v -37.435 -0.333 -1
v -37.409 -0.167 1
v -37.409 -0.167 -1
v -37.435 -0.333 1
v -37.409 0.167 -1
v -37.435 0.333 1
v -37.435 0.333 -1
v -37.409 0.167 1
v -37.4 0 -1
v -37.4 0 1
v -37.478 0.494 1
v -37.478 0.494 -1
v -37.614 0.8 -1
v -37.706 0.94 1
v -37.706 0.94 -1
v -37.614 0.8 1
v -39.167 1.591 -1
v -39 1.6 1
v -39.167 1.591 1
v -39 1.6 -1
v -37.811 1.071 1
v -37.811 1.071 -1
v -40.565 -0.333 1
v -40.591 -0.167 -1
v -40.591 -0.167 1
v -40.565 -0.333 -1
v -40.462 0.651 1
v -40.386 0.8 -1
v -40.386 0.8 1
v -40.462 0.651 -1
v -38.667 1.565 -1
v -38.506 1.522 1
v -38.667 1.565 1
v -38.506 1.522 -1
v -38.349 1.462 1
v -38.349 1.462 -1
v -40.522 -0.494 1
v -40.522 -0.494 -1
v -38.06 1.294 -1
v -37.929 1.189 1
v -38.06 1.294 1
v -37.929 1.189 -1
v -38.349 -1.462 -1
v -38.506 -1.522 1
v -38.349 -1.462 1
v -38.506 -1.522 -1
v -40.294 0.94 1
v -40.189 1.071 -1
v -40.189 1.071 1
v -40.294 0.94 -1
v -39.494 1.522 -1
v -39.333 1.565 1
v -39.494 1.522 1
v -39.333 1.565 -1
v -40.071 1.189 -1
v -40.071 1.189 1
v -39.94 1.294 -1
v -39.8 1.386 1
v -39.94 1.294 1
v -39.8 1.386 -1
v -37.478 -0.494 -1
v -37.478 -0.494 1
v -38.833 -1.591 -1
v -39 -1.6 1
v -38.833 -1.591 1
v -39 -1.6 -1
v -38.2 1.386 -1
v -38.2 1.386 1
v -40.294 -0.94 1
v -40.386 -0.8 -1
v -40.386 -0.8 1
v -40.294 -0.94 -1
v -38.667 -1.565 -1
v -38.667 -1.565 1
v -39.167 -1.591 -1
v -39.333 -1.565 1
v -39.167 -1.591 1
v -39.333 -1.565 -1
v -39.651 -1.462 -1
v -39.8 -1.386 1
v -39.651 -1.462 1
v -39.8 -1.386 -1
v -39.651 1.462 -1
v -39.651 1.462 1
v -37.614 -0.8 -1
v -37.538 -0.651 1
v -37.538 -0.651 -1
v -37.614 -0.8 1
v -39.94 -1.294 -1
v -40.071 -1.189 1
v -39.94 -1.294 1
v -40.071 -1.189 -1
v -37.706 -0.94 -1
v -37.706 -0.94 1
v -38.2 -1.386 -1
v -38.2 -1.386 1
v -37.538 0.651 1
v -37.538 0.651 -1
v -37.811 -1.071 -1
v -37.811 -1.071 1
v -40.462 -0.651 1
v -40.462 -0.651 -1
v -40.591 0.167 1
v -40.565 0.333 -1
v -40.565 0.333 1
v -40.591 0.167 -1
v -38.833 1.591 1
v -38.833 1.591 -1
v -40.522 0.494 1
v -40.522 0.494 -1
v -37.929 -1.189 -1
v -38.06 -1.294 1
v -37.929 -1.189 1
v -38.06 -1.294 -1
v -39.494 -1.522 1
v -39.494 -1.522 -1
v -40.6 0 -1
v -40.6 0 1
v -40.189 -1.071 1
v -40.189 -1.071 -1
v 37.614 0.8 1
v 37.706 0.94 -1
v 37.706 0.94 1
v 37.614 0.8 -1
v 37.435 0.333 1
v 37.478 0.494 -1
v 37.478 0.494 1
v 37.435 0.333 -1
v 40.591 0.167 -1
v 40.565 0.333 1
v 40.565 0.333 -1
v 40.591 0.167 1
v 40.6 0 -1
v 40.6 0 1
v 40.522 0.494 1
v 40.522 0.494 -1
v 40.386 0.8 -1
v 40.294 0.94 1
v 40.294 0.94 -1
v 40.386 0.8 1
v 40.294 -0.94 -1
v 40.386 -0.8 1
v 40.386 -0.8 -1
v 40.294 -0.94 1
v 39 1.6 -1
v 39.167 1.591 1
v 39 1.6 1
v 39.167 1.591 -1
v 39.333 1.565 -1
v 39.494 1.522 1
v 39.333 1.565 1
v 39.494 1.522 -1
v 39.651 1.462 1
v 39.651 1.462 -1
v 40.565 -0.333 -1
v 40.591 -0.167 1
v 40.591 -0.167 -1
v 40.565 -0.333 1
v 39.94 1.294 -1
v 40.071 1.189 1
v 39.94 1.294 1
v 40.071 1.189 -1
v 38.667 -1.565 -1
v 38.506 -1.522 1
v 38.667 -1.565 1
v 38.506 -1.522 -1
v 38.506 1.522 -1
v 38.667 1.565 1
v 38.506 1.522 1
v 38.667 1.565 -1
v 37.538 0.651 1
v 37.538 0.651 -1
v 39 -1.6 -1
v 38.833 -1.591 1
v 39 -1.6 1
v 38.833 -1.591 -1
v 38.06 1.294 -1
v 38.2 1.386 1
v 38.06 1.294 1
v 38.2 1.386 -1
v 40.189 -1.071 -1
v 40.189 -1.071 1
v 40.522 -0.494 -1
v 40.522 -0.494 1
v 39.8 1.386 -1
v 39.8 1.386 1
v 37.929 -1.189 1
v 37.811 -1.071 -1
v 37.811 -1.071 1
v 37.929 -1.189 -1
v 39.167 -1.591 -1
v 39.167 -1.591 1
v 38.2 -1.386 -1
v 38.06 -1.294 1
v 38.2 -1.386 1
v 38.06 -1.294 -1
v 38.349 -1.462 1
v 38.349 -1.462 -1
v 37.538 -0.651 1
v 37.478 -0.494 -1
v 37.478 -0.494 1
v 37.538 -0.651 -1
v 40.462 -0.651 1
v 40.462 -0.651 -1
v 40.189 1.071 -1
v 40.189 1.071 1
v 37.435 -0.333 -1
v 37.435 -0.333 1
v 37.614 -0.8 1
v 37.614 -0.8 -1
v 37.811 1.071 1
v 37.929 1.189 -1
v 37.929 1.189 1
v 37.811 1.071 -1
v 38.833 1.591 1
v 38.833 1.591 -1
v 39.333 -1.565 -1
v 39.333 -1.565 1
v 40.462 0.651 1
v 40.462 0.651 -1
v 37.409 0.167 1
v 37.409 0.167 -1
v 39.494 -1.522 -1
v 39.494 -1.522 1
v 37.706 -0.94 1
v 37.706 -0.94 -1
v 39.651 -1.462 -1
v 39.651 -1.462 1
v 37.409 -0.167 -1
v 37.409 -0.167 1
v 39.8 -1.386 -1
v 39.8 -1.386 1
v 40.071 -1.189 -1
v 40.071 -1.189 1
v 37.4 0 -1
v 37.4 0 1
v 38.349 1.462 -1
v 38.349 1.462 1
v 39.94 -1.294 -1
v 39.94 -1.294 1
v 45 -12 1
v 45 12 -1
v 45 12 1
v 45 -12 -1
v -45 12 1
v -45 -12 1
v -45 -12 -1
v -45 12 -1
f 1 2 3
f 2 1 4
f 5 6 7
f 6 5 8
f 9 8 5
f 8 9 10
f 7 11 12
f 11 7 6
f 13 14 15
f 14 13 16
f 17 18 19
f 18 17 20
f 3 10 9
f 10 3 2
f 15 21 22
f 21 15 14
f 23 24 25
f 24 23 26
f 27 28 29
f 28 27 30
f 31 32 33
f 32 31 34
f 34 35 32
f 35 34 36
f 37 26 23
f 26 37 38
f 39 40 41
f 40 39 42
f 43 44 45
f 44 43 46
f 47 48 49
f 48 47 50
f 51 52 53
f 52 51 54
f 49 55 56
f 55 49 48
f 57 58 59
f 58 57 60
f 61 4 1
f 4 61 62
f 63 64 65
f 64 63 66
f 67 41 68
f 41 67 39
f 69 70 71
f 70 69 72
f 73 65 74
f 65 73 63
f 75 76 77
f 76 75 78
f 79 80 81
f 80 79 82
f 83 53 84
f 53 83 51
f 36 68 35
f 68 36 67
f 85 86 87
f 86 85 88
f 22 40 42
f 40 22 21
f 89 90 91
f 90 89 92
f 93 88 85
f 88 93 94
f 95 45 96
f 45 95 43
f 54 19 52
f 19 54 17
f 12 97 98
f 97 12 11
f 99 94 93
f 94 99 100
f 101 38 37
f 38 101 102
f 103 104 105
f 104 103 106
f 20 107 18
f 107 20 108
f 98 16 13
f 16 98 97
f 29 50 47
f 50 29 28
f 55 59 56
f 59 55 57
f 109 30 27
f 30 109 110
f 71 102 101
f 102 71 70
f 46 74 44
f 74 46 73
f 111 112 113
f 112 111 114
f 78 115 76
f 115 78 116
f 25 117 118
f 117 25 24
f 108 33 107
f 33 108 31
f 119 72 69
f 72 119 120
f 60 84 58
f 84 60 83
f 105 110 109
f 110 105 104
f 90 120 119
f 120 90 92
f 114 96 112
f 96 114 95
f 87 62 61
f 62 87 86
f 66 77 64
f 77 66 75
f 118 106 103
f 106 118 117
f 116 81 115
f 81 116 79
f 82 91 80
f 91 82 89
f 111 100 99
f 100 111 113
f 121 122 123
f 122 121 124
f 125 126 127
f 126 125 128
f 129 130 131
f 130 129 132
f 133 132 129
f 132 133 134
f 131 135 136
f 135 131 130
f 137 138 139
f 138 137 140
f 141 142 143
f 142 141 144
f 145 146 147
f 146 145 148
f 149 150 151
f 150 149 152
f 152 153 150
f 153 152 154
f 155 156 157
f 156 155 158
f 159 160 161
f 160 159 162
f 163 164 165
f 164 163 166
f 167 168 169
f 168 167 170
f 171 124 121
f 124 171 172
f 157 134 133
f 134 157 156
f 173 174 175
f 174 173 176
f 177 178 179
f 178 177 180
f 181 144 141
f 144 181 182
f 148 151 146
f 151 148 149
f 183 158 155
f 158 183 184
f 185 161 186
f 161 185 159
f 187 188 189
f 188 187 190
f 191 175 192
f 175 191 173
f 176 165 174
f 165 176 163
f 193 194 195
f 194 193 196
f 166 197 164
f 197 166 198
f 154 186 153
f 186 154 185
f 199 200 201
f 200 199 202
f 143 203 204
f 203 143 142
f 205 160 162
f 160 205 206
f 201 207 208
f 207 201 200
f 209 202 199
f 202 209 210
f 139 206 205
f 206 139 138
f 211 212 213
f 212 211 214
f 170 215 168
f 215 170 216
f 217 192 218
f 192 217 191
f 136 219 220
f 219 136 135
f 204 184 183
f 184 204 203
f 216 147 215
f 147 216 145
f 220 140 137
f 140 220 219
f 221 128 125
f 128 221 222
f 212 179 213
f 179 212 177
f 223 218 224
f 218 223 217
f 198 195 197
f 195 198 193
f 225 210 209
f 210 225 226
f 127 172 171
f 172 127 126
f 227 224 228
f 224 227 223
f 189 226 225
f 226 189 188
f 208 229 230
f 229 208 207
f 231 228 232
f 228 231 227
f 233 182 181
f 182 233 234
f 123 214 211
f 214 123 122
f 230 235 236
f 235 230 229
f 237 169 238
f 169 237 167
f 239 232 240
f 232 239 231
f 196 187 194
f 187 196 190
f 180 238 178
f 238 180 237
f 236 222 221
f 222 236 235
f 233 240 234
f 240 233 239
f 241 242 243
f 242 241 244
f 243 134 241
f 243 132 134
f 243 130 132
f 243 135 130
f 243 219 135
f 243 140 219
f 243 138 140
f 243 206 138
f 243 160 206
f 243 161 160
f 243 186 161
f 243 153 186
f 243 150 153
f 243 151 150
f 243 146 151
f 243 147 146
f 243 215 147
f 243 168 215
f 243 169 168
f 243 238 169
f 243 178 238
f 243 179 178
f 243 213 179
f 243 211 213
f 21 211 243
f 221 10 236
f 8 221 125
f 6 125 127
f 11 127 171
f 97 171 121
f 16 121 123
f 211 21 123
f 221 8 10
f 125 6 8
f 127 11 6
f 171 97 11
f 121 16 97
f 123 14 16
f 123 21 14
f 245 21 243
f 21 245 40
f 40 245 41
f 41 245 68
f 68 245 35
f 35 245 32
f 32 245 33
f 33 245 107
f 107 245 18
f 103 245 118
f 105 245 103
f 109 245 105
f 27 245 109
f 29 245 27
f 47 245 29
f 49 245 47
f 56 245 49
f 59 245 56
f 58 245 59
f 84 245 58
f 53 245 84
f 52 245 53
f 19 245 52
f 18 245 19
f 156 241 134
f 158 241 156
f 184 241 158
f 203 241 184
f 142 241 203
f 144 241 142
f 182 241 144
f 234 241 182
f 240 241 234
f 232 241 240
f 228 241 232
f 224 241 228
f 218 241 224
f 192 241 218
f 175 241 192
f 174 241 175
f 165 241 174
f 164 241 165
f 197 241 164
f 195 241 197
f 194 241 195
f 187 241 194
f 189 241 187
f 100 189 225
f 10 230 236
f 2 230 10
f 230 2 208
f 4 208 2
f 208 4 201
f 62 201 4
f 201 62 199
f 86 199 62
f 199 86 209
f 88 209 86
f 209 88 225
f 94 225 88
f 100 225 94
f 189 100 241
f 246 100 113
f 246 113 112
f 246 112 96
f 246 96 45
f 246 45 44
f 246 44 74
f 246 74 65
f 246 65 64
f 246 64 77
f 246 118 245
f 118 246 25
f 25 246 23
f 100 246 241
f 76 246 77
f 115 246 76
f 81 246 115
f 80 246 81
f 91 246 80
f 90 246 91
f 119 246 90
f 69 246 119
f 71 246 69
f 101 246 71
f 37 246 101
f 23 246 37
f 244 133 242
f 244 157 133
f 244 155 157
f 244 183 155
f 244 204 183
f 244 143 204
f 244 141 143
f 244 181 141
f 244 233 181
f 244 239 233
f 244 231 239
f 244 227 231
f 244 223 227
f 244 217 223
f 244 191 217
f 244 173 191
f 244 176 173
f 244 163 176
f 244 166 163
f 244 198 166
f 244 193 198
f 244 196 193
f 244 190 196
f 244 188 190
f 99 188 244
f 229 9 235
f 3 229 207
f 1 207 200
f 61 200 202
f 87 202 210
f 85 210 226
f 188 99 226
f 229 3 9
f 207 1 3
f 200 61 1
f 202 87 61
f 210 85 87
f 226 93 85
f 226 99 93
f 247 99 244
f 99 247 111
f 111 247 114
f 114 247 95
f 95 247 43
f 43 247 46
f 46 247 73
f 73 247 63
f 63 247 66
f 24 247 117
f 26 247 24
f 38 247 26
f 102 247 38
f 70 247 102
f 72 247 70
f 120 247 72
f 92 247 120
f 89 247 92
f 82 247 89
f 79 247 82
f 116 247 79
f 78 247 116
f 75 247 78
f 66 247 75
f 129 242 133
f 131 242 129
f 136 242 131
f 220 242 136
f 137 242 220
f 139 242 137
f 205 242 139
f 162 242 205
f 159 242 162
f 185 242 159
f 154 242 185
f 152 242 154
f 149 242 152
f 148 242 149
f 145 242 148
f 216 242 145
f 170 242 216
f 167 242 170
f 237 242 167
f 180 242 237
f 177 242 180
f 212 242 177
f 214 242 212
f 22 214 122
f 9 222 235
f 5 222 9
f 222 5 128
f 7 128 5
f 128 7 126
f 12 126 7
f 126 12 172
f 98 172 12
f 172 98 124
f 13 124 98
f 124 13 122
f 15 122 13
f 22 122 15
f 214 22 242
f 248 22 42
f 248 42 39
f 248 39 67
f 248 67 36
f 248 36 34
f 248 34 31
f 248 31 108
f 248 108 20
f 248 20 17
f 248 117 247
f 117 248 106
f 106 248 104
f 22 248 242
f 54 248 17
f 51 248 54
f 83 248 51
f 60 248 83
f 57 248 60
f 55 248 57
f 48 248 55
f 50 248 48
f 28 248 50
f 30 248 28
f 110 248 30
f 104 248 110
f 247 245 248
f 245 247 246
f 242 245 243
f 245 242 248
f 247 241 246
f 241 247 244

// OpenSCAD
// Engraving-ready nameplate.
$fn = 60;
eps = 0.02;
length = 90;
width = 24;
thickness = 2;
difference() { cube([length,width,thickness],center=true); for(x=[-length/2+6,length/2-6]) translate([x,0,-thickness/2-eps]) cylinder(d=3.2,h=thickness+2*eps); }
